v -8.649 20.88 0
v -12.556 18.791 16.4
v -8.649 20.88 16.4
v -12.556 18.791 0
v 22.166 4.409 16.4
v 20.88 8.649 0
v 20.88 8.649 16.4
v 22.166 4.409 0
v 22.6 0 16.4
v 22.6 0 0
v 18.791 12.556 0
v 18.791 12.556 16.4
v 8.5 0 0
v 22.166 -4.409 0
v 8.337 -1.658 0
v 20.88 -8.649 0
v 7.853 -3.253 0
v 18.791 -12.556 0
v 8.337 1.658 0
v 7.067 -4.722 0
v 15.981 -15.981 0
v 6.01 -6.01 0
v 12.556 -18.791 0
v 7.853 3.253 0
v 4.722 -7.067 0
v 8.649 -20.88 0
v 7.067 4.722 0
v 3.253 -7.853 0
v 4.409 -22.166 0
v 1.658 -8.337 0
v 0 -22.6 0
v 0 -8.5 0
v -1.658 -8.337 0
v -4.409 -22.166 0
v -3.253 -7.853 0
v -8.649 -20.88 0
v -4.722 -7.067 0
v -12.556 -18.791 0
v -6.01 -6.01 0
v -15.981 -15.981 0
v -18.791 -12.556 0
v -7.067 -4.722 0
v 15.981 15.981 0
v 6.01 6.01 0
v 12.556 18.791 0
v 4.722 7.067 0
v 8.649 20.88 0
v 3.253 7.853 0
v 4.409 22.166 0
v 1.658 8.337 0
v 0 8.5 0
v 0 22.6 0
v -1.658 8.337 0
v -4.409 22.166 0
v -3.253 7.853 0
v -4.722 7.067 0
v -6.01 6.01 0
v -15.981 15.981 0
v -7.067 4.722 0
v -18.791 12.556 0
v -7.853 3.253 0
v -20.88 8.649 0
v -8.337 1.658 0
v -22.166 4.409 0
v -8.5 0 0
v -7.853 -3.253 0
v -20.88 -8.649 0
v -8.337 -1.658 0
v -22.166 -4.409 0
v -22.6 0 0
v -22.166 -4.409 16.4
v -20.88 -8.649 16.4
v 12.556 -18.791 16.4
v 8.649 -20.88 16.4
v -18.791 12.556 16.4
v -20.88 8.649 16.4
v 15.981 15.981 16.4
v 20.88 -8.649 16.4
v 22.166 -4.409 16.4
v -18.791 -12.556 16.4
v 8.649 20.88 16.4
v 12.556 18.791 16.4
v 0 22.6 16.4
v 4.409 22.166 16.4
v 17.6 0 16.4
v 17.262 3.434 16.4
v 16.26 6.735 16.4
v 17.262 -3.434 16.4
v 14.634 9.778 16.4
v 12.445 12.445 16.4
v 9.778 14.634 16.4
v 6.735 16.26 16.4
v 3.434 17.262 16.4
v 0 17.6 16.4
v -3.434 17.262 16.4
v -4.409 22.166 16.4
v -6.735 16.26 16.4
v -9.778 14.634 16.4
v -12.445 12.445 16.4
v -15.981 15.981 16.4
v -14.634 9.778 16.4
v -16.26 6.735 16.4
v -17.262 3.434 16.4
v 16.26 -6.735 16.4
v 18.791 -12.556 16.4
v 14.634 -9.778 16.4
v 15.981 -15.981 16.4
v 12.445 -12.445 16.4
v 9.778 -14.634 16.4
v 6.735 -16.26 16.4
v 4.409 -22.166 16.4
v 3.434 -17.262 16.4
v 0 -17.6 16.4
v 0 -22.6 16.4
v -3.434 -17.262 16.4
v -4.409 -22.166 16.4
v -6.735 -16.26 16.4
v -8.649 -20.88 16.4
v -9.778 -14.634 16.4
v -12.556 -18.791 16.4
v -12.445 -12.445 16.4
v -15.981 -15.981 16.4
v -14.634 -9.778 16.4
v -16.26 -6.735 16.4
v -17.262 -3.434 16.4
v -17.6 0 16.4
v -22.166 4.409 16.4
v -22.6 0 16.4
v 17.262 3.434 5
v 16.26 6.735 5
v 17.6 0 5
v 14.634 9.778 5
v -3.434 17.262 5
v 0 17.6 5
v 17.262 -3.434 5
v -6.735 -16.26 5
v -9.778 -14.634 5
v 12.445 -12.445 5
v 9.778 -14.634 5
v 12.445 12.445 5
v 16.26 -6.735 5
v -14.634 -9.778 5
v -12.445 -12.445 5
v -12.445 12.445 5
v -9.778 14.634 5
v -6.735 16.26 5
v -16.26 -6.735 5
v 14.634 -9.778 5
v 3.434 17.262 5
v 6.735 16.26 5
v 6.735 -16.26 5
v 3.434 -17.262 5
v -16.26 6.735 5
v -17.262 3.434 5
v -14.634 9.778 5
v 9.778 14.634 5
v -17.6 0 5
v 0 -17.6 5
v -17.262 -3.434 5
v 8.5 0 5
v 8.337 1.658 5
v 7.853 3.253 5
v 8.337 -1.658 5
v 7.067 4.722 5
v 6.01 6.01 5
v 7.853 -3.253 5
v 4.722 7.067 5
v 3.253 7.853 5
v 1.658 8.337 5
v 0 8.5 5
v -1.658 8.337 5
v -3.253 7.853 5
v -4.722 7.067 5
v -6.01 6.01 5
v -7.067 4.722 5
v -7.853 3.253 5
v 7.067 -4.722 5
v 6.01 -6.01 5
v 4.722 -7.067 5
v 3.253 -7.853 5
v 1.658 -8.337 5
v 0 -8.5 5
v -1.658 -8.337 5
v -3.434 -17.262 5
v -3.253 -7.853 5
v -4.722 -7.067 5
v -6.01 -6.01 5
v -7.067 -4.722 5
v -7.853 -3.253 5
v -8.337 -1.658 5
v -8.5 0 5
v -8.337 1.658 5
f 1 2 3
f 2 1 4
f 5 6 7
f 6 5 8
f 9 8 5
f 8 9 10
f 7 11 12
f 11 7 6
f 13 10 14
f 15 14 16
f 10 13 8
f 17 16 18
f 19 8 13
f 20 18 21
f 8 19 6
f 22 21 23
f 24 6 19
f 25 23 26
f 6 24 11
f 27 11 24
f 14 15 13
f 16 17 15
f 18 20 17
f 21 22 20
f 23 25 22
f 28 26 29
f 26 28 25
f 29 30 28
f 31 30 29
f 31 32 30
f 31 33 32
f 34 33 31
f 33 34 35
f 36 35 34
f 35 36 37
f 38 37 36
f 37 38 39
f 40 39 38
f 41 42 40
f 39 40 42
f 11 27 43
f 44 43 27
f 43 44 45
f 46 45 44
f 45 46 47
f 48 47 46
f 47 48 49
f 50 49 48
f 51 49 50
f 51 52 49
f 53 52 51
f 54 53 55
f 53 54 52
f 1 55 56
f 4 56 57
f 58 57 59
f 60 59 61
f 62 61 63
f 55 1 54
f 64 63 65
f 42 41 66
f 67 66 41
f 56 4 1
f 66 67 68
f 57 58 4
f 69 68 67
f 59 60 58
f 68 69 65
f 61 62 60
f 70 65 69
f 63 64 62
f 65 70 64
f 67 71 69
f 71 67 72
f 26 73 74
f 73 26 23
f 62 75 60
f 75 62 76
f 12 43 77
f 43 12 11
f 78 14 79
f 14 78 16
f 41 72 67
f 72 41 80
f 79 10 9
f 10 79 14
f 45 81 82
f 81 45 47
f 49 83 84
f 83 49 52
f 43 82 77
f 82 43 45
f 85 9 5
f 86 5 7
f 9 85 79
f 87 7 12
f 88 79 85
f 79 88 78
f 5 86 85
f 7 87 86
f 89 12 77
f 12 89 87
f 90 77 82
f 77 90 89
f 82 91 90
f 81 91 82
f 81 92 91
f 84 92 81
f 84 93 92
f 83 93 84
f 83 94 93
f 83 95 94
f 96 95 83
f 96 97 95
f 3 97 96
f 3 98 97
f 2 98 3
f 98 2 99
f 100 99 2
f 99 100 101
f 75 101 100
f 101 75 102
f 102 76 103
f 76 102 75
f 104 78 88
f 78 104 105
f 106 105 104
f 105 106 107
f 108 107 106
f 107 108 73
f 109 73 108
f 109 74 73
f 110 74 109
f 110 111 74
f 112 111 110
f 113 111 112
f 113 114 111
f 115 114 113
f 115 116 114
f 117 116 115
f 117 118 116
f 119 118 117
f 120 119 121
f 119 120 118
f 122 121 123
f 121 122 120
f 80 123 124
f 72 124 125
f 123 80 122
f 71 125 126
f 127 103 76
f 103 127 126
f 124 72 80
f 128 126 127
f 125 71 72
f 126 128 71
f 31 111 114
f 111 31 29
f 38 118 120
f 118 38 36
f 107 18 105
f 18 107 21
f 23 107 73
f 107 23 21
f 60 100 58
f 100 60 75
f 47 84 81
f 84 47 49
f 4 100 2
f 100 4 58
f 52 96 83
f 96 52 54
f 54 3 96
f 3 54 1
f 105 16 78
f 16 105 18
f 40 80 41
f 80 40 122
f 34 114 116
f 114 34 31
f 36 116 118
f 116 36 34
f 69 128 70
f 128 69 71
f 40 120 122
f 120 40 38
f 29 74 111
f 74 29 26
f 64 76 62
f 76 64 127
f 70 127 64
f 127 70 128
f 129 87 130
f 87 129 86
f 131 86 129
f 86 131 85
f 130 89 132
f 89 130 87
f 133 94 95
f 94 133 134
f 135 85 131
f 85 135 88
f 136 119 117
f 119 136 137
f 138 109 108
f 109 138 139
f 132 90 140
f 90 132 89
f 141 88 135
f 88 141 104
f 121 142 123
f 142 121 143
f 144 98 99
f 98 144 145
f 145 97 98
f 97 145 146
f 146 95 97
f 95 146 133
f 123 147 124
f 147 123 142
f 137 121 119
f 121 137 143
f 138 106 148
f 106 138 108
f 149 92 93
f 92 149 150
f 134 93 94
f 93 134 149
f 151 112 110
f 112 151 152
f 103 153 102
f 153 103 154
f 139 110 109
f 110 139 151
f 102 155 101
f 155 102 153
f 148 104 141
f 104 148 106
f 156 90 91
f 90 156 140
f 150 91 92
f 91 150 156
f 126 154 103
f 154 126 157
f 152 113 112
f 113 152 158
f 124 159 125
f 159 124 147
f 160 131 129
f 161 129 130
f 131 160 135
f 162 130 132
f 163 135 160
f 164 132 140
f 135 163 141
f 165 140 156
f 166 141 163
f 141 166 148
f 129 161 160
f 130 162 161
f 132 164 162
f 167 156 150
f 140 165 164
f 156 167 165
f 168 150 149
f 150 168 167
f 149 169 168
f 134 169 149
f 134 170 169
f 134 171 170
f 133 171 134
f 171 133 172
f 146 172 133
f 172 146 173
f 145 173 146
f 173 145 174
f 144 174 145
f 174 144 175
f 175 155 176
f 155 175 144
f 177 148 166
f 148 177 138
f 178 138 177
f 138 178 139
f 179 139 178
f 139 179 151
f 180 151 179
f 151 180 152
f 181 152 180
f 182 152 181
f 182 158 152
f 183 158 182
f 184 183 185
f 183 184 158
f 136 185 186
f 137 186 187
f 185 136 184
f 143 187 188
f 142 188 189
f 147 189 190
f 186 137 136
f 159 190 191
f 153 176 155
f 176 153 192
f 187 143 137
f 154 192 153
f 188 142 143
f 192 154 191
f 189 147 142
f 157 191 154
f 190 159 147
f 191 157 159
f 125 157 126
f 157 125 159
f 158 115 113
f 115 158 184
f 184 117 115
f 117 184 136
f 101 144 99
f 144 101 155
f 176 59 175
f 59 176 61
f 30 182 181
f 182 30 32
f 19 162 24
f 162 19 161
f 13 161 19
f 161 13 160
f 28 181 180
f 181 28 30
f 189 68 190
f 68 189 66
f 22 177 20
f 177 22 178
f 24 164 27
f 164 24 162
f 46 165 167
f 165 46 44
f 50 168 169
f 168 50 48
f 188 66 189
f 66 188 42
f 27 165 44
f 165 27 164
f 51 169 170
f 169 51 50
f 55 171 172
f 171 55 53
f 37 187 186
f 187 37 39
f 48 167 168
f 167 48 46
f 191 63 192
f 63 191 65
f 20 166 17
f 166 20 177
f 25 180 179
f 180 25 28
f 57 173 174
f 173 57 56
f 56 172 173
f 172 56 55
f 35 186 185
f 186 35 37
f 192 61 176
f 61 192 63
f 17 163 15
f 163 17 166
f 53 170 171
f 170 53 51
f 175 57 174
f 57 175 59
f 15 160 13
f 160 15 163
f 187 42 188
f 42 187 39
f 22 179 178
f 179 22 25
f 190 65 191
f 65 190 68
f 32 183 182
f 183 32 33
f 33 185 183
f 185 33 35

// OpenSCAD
$fn = 32;

// ----------------------------------------------------------------------
// Bearing housing: seat for 6202 (35 x 11 mm), 45.2 mm body
// ----------------------------------------------------------------------

// --- parameters (mm) ---
body_od = 45.2;           // housing outside diameter
body_h = 16.4;            // overall housing height
wall = 5;                 // wall thickness
pocket_d = 35.2;          // 6202 seat, 0.2 mm clearance
seat_h = 11.4;            // pocket depth
shoulder = 5;             // shoulder under the bearing
pass_d = 17;              // shaft passage

module body() {
  cylinder(h = body_h, d = body_od);
}

difference() {
  union() {
    body();
  }
  translate([0, 0, body_h - seat_h]) cylinder(h = seat_h + 1, d = pocket_d);
  translate([0, 0, -1]) cylinder(h = body_h - seat_h + 1, d = pass_d);
}
